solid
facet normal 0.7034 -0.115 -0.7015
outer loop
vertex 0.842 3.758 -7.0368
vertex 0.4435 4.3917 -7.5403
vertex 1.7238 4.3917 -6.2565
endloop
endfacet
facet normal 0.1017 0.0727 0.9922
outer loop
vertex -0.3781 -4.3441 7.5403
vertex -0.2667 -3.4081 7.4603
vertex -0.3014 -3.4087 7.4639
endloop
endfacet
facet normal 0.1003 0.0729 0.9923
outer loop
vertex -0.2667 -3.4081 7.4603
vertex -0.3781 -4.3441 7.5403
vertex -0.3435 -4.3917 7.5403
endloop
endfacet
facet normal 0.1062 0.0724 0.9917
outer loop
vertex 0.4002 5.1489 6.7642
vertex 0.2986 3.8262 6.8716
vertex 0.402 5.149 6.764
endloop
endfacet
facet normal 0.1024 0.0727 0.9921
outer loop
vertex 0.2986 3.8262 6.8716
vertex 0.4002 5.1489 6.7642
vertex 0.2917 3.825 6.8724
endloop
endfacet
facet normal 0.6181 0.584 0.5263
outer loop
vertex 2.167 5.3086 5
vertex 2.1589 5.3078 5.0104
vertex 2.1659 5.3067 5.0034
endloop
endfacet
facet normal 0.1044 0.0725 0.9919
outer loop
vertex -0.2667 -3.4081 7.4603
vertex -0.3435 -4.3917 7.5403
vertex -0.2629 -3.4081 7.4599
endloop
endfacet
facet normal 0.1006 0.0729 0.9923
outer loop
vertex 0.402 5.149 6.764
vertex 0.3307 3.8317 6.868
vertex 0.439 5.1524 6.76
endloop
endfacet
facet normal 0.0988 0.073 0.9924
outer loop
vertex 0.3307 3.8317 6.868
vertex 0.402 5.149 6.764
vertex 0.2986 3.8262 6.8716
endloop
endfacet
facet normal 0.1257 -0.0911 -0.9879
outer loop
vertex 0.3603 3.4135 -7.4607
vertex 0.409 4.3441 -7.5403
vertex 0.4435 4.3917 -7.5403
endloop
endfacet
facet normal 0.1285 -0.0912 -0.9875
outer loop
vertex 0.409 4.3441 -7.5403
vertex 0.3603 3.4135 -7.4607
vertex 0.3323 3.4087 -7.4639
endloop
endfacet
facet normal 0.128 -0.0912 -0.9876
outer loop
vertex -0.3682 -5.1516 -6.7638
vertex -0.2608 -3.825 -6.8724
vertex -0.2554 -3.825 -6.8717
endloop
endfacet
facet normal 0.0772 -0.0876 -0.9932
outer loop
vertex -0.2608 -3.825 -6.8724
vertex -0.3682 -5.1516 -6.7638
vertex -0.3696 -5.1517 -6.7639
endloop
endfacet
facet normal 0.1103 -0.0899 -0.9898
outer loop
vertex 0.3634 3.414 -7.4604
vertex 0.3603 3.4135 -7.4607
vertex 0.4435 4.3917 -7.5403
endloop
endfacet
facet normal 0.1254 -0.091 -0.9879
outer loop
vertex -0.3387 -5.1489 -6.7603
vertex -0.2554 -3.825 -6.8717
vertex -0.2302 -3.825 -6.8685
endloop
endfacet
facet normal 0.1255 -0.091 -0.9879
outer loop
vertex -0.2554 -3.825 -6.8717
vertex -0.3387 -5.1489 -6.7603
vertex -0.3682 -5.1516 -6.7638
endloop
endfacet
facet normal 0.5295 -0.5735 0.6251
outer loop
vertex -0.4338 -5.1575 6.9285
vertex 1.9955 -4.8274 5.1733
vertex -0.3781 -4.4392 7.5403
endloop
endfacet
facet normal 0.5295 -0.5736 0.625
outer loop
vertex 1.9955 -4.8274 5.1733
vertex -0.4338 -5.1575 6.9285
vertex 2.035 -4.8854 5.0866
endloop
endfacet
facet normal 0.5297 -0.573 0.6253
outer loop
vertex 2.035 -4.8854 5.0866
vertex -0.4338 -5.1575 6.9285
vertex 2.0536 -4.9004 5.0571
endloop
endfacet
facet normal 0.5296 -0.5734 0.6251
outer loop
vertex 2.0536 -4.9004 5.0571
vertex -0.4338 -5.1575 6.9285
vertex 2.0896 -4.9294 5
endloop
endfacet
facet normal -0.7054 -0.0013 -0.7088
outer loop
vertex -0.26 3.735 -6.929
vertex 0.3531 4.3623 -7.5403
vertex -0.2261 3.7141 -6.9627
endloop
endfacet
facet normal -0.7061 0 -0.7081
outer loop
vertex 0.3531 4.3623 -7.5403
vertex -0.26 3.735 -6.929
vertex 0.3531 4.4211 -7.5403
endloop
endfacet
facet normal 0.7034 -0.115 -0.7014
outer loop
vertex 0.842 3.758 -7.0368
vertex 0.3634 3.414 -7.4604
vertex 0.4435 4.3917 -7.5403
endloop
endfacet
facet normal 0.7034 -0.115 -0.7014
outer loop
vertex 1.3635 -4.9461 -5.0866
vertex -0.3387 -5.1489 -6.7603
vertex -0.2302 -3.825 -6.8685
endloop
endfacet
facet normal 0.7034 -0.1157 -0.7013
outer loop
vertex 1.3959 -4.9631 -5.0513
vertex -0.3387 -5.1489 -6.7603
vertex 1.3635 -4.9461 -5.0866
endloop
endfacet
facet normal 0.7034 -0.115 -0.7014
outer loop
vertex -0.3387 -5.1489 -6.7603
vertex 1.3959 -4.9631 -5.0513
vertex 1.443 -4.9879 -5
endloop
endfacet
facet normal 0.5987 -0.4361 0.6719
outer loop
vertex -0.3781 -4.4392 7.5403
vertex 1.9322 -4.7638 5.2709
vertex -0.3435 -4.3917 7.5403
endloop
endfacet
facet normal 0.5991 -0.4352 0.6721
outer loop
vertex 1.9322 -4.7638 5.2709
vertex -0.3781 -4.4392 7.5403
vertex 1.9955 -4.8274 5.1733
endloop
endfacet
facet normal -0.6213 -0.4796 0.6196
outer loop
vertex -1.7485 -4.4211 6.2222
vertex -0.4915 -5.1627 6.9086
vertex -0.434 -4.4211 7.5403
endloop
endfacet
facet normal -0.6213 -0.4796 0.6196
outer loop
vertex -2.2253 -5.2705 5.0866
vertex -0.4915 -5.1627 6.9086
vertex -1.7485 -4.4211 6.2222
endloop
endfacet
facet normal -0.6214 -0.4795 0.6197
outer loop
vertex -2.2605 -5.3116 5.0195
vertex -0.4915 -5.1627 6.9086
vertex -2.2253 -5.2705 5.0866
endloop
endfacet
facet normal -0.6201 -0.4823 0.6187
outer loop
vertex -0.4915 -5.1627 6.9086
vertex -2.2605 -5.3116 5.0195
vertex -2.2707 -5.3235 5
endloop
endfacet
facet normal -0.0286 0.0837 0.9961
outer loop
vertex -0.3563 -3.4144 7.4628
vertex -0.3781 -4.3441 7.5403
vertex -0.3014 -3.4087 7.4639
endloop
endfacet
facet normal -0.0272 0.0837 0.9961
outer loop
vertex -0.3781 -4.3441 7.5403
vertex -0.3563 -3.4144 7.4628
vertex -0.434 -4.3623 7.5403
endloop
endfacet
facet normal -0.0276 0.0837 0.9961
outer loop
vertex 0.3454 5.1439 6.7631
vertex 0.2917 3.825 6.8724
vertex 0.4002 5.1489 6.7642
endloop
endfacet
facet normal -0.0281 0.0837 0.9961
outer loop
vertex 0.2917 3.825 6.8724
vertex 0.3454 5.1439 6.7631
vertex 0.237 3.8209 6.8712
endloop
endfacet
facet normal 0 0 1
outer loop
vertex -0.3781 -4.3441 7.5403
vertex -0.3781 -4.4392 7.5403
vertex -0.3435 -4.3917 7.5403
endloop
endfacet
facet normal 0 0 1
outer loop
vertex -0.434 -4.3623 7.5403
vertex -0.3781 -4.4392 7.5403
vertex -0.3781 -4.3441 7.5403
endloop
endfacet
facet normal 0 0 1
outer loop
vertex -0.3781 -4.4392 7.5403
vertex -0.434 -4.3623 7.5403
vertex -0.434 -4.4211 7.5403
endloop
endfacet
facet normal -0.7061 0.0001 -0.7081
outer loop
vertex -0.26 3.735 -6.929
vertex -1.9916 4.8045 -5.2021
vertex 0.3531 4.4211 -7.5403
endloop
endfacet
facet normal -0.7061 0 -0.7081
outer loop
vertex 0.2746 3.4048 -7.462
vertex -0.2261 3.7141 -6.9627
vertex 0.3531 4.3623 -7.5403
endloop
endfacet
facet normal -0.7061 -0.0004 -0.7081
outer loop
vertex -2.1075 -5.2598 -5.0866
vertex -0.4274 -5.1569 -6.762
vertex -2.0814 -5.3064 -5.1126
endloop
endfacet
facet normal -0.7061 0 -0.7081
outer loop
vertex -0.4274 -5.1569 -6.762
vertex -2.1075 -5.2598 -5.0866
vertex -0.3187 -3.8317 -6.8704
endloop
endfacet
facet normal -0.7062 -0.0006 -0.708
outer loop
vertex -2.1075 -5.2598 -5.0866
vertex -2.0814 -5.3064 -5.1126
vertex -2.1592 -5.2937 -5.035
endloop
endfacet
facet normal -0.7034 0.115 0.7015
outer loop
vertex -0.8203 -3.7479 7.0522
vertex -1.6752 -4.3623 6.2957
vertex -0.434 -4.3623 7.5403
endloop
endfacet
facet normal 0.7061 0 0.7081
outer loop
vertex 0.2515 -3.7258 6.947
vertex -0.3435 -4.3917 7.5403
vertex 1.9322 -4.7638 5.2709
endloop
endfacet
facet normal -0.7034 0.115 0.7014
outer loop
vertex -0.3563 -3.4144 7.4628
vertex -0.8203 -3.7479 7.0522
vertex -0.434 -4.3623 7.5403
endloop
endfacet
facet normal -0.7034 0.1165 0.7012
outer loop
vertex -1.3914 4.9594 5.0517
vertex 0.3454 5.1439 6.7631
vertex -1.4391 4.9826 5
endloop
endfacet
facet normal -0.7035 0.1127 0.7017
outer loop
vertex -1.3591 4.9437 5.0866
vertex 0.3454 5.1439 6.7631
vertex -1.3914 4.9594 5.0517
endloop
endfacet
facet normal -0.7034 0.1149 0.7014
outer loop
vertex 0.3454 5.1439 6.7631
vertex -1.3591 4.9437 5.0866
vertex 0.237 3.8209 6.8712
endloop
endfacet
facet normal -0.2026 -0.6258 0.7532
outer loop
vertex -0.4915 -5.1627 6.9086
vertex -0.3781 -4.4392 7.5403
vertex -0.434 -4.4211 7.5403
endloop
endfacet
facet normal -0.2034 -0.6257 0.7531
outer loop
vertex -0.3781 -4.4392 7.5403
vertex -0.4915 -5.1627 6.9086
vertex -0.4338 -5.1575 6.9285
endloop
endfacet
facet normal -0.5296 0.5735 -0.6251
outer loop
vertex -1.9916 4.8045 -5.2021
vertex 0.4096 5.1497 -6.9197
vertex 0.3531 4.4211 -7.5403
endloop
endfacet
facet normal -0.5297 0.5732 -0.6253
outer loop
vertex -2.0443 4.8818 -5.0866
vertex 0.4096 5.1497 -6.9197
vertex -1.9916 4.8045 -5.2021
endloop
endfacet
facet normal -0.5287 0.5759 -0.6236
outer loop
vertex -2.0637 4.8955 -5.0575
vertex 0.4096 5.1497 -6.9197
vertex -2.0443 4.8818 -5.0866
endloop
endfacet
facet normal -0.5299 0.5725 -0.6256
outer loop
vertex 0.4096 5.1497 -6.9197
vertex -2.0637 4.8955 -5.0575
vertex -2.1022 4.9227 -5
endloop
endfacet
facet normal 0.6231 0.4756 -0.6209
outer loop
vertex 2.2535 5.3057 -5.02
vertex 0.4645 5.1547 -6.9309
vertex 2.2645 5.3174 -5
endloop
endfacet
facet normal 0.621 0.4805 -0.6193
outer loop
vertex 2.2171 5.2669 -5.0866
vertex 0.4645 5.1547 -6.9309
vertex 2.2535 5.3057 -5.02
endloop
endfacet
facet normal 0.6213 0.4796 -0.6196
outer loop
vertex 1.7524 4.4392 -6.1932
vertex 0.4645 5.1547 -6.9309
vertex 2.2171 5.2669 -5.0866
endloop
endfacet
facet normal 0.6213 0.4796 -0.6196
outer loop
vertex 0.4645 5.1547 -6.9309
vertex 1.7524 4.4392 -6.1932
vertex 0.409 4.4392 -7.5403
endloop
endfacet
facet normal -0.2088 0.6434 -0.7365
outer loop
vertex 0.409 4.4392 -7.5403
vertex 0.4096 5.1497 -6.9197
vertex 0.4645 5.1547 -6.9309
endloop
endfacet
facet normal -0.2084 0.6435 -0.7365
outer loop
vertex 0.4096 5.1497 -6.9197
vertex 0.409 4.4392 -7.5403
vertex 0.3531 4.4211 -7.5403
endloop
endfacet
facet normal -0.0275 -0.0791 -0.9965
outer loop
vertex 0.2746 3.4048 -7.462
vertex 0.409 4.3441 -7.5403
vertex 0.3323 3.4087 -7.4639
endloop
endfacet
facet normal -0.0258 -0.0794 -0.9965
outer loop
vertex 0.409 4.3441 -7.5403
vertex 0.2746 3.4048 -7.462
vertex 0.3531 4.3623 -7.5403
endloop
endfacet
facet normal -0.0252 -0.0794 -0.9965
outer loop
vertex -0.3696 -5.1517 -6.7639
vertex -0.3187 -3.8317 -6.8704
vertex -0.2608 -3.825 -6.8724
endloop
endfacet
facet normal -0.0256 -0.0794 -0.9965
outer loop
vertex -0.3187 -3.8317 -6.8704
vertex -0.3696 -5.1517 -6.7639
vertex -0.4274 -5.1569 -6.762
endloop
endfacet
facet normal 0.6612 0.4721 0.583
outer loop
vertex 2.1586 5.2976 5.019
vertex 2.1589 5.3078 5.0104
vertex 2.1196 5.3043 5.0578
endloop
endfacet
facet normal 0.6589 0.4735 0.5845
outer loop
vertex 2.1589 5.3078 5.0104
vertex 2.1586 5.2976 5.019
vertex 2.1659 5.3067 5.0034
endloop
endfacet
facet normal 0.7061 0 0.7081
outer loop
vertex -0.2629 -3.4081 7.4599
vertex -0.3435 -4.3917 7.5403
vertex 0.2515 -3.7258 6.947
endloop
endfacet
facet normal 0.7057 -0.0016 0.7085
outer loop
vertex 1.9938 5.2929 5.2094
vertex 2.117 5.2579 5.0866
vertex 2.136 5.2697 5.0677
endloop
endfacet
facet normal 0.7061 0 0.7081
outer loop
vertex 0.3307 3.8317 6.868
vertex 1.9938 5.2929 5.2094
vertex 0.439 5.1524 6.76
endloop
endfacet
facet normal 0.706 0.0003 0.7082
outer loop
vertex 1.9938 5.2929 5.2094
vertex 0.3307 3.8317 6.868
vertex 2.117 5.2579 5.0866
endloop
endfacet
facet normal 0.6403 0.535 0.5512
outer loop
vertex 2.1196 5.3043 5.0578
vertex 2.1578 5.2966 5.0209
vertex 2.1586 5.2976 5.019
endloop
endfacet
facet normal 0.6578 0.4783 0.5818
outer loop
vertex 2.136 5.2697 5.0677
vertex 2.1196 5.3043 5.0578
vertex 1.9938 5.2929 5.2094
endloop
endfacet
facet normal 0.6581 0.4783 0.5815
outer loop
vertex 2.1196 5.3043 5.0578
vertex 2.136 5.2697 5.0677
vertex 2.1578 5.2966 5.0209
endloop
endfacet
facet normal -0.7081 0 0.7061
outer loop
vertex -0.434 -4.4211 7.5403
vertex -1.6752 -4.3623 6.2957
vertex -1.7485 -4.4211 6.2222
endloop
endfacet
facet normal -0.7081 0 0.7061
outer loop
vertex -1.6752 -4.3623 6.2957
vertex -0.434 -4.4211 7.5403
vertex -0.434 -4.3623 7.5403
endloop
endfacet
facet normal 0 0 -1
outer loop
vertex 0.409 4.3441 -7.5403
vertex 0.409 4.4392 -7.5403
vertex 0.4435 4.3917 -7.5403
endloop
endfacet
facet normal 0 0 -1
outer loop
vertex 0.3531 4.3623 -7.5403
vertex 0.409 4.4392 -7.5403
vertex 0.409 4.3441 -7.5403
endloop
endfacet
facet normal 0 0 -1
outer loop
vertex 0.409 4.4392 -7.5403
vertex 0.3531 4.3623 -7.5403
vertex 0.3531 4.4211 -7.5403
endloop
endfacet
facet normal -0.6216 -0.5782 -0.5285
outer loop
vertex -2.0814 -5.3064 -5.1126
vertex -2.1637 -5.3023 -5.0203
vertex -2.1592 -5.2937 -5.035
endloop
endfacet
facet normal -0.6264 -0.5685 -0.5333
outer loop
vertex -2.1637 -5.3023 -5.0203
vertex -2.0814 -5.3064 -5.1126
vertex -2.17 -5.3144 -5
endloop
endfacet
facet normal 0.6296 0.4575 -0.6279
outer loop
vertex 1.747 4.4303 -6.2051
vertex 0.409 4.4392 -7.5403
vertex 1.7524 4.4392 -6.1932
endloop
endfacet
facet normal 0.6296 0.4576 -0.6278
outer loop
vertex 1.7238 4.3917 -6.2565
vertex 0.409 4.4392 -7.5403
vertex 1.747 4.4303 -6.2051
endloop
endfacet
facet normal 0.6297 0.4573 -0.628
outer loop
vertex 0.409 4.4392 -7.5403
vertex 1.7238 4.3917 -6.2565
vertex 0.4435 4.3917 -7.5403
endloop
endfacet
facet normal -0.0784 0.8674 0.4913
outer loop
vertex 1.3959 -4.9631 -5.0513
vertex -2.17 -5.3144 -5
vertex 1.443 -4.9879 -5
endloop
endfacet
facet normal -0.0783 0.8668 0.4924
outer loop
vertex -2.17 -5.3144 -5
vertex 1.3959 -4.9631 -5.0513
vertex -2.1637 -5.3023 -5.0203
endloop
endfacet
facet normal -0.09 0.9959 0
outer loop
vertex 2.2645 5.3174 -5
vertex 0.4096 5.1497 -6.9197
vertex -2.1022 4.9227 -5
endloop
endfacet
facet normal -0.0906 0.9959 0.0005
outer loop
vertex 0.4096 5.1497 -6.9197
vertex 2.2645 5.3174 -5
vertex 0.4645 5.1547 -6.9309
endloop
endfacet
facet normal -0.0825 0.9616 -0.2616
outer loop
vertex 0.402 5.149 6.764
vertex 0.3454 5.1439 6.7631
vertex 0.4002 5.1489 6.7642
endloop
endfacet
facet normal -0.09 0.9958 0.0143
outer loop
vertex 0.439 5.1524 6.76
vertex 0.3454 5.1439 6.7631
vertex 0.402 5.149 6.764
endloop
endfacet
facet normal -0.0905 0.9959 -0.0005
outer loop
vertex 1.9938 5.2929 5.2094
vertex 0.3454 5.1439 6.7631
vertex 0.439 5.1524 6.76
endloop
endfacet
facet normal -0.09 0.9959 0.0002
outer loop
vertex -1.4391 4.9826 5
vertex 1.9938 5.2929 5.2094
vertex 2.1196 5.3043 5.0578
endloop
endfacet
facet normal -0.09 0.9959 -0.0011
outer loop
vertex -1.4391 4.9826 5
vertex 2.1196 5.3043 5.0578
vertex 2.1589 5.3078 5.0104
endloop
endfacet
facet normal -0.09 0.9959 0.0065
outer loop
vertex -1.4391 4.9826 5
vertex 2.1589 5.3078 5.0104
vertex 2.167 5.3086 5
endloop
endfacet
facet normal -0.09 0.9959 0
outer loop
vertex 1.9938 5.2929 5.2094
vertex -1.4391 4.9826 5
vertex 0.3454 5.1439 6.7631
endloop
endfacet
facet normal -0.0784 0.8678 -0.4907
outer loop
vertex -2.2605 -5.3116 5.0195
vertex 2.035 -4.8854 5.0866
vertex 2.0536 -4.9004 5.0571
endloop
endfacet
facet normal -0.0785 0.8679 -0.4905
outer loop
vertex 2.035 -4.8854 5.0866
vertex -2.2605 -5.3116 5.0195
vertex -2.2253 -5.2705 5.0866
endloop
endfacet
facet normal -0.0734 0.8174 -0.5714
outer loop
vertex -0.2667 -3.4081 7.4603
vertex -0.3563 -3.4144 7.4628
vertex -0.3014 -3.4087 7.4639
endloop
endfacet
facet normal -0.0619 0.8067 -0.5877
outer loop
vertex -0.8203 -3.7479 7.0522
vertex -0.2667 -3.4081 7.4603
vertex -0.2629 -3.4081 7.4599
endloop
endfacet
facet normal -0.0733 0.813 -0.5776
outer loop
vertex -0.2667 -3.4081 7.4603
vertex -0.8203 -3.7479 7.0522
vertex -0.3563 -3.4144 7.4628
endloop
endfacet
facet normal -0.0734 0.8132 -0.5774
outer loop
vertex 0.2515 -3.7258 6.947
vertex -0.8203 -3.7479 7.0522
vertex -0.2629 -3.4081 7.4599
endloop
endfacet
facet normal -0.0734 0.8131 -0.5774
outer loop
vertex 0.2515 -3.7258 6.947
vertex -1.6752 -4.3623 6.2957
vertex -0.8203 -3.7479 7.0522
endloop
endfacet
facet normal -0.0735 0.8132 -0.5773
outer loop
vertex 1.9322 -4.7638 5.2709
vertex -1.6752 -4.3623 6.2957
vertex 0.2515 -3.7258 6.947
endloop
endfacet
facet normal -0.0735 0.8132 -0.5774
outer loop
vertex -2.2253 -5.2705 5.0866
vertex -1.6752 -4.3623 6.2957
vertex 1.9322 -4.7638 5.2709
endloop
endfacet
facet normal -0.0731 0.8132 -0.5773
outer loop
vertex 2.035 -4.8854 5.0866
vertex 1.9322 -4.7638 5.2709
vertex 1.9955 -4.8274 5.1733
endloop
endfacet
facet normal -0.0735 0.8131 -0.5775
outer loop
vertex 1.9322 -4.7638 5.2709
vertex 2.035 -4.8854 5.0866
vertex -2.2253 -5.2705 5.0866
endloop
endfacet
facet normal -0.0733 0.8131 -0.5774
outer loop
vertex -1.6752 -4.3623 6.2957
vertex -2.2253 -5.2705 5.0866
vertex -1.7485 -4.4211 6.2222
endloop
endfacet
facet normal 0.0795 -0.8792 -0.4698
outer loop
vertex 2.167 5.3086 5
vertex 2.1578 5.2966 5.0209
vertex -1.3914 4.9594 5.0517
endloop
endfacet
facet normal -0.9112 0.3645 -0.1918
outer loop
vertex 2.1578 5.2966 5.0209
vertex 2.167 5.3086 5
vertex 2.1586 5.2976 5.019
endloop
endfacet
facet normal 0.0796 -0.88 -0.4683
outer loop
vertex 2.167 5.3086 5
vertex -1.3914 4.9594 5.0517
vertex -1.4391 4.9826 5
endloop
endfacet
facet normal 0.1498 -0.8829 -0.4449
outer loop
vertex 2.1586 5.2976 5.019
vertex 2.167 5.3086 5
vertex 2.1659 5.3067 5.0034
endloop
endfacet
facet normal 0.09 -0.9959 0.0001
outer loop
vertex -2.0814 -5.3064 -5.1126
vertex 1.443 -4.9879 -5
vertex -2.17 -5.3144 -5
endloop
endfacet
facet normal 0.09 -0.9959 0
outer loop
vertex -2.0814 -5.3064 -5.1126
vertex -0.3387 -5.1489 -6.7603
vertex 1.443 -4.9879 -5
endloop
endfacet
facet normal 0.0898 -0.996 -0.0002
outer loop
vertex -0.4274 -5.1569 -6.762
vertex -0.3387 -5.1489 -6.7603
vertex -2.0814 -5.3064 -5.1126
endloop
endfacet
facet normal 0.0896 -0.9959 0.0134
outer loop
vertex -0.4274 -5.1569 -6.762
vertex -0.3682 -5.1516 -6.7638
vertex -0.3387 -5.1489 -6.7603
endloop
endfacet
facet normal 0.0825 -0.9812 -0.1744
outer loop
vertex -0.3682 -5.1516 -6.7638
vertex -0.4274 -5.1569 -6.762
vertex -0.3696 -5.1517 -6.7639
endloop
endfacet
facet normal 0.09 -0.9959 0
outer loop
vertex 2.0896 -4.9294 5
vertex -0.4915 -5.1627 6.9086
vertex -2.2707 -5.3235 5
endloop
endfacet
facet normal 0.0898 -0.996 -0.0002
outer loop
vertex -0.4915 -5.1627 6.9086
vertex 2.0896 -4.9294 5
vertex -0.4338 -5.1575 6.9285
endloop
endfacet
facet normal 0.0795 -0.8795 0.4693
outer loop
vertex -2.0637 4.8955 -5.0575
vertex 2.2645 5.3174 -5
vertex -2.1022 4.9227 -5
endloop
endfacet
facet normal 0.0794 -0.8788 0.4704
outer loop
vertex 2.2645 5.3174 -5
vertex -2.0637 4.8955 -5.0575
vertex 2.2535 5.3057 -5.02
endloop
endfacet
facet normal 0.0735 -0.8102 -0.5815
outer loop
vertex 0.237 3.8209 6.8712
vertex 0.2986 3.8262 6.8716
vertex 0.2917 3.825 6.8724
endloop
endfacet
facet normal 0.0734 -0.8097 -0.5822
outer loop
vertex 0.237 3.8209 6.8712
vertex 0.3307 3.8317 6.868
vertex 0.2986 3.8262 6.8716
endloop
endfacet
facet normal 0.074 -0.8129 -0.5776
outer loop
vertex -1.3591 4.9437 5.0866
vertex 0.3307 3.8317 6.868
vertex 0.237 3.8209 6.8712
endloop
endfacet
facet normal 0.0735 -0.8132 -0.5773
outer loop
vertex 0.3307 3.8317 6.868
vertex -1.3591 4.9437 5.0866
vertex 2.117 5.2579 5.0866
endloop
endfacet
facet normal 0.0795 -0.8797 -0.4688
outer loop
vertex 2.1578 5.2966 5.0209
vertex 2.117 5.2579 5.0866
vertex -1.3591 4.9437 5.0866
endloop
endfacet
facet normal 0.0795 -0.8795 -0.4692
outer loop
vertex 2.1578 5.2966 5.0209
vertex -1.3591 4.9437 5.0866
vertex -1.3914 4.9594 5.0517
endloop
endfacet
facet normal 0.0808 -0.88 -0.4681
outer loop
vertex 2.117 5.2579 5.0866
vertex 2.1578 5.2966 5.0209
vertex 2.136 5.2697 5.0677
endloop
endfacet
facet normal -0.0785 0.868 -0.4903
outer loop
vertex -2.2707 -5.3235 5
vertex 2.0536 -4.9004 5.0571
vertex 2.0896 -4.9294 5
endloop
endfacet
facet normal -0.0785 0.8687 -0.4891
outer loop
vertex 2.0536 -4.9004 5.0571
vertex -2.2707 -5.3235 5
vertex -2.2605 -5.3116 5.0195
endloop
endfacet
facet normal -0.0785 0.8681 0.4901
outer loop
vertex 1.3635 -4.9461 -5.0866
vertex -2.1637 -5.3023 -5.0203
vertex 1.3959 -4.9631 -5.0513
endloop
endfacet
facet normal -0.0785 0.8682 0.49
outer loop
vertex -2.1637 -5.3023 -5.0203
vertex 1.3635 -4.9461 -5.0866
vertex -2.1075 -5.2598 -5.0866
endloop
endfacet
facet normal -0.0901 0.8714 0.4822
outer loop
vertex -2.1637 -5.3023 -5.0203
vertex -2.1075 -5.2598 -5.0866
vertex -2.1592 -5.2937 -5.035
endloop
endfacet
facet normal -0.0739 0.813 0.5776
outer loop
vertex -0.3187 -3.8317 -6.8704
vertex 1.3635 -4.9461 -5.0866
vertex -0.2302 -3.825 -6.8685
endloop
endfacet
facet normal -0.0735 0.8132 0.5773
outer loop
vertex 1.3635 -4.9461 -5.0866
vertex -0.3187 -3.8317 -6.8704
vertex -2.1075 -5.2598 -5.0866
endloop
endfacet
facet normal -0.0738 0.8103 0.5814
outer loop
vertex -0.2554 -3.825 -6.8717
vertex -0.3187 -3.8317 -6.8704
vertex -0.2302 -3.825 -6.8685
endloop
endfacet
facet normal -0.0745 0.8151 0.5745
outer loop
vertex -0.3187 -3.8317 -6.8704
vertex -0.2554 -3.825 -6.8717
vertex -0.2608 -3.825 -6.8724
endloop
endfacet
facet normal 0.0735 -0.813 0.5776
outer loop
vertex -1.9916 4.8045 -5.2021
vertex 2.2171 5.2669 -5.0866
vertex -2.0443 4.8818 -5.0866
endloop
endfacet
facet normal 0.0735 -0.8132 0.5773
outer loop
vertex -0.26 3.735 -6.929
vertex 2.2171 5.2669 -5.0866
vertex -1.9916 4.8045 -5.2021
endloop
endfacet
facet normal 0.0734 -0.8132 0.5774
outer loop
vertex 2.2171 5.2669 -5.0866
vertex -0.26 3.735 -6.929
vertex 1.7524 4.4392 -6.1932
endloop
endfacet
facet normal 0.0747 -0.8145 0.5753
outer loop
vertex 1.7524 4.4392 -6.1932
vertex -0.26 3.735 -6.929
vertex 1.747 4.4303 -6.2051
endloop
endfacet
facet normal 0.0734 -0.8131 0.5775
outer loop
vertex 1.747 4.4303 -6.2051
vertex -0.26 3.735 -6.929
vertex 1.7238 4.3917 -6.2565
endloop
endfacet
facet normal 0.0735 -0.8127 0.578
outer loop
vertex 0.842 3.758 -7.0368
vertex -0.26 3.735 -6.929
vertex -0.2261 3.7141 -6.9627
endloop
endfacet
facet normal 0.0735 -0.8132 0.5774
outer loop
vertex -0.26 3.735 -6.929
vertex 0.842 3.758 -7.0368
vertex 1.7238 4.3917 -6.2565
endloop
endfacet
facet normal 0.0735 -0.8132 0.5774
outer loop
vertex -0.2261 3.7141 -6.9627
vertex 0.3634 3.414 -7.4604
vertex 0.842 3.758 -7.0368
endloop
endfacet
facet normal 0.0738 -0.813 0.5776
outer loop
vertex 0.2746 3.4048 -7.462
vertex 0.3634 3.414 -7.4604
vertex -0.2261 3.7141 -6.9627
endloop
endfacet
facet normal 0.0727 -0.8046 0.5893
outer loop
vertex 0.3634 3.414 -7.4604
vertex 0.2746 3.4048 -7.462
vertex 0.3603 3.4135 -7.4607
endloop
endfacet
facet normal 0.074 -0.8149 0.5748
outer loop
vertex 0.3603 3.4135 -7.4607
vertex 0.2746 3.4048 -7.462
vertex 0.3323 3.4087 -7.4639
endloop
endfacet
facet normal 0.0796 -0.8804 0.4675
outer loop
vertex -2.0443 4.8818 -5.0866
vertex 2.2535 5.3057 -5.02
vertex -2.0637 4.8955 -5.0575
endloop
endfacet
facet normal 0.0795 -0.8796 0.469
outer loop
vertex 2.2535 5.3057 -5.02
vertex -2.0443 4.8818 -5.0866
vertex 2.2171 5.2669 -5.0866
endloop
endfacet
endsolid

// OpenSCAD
// Auto-generated OpenSCAD file

    inner_points = 10*[[0.5429769689115526, -0.4529635870924383, 0.49999999999997413], [0.5429769689115337, -0.4529635870924037, -0.500000000000026], [-0.4529635870924116, -0.5429769689115604, 0.49999999999998984], [-0.4529635870924304, -0.5429769689115258, -0.5000000000000102], [0.4529635870924304, 0.5429769689115258, 0.5000000000000102], [0.4529635870924116, 0.5429769689115604, -0.49999999999998984], [-0.5429769689115337, 0.4529635870924037, 0.500000000000026], [-0.5429769689115526, 0.4529635870924383, -0.49999999999997413], [2.2755059616728634e-14, -4.168991678798836e-14, 1.2071067811865475], [-2.2755059616728634e-14, 4.168991678798836e-14, -1.2071067811865475]];

    outer_points = 10*[[-0.039354312458118546, -0.43916949600833827, 0.7453733238228553], [0.04209249648260477, 0.5541932458770876, 0.6641521421813528], [0.6640328188038629, -0.5541932458770876, 0.04393474451517876], [0.7454796277445863, 0.43916949600833827, -0.03728643712632368], [-0.7454796277445863, -0.43916949600833827, 0.03728643712632368], [-0.6640328188038629, 0.5541932458770876, -0.04393474451517876], [-0.04209249648260477, -0.5541932458770876, -0.6641521421813528], [0.039354312458118546, 0.43916949600833827, -0.7453733238228553], [-0.09831499537835225, -1.1990949019079598, 0.09804263913544194], [0.09831499537835225, 1.1990949019079598, -0.09804263913544194]];

    // Convex hull for inner set (I)
    module inner_hull() {
        hull() {
            for (p = inner_points) {
                translate(p) sphere(r=0.1);
            }
        }
    }

    // Convex hull for outer set (O) minus inner hull (O \ I)
    module outer_minus_inner() {
        difference() {
            hull() {
                for (p = outer_points) {
                    translate(p) sphere(r=0.1);
                }
            }
            inner_hull(); // Subtract inner hull
        }
    }

    // Convex hull for outer set (O) minus all translated inner hulls
    module outer_minus_AllTranslationInner() {
        difference() {
            hull() {
                for (p = outer_points) {
                    translate(p) sphere(r=0.1);
                }
            }
            hull() {
                translate([0,0,50]) inner_hull();
                translate([0,0,-50]) inner_hull();
            }; // Subtract translated inner hulls
        }
    }

    // Difference between outer_minus_inner and outer_minus_AllTranslationInner
    module outer_minus_inner_diff() {
        difference() {
            // Outer minus inner
            difference() {
                hull() {
                    for (p = outer_points) {
                        translate(p) sphere(r=0.1);
                    }
                }
                inner_hull();
            }

            // Subtract Outer minus AllTranslationInner
            difference() {
                hull() {
                    for (p = outer_points) {
                        translate(p) sphere(r=0.1);
                    }
                }
                hull() {
                    translate([0,0,50]) inner_hull();
                    translate([0,0,-50]) inner_hull();
                };
            }
        }
    }

    // Rendering all with colors applied
    color([1, 1, 0, 1]) outer_minus_inner_diff(); // Opaque yellow
    
